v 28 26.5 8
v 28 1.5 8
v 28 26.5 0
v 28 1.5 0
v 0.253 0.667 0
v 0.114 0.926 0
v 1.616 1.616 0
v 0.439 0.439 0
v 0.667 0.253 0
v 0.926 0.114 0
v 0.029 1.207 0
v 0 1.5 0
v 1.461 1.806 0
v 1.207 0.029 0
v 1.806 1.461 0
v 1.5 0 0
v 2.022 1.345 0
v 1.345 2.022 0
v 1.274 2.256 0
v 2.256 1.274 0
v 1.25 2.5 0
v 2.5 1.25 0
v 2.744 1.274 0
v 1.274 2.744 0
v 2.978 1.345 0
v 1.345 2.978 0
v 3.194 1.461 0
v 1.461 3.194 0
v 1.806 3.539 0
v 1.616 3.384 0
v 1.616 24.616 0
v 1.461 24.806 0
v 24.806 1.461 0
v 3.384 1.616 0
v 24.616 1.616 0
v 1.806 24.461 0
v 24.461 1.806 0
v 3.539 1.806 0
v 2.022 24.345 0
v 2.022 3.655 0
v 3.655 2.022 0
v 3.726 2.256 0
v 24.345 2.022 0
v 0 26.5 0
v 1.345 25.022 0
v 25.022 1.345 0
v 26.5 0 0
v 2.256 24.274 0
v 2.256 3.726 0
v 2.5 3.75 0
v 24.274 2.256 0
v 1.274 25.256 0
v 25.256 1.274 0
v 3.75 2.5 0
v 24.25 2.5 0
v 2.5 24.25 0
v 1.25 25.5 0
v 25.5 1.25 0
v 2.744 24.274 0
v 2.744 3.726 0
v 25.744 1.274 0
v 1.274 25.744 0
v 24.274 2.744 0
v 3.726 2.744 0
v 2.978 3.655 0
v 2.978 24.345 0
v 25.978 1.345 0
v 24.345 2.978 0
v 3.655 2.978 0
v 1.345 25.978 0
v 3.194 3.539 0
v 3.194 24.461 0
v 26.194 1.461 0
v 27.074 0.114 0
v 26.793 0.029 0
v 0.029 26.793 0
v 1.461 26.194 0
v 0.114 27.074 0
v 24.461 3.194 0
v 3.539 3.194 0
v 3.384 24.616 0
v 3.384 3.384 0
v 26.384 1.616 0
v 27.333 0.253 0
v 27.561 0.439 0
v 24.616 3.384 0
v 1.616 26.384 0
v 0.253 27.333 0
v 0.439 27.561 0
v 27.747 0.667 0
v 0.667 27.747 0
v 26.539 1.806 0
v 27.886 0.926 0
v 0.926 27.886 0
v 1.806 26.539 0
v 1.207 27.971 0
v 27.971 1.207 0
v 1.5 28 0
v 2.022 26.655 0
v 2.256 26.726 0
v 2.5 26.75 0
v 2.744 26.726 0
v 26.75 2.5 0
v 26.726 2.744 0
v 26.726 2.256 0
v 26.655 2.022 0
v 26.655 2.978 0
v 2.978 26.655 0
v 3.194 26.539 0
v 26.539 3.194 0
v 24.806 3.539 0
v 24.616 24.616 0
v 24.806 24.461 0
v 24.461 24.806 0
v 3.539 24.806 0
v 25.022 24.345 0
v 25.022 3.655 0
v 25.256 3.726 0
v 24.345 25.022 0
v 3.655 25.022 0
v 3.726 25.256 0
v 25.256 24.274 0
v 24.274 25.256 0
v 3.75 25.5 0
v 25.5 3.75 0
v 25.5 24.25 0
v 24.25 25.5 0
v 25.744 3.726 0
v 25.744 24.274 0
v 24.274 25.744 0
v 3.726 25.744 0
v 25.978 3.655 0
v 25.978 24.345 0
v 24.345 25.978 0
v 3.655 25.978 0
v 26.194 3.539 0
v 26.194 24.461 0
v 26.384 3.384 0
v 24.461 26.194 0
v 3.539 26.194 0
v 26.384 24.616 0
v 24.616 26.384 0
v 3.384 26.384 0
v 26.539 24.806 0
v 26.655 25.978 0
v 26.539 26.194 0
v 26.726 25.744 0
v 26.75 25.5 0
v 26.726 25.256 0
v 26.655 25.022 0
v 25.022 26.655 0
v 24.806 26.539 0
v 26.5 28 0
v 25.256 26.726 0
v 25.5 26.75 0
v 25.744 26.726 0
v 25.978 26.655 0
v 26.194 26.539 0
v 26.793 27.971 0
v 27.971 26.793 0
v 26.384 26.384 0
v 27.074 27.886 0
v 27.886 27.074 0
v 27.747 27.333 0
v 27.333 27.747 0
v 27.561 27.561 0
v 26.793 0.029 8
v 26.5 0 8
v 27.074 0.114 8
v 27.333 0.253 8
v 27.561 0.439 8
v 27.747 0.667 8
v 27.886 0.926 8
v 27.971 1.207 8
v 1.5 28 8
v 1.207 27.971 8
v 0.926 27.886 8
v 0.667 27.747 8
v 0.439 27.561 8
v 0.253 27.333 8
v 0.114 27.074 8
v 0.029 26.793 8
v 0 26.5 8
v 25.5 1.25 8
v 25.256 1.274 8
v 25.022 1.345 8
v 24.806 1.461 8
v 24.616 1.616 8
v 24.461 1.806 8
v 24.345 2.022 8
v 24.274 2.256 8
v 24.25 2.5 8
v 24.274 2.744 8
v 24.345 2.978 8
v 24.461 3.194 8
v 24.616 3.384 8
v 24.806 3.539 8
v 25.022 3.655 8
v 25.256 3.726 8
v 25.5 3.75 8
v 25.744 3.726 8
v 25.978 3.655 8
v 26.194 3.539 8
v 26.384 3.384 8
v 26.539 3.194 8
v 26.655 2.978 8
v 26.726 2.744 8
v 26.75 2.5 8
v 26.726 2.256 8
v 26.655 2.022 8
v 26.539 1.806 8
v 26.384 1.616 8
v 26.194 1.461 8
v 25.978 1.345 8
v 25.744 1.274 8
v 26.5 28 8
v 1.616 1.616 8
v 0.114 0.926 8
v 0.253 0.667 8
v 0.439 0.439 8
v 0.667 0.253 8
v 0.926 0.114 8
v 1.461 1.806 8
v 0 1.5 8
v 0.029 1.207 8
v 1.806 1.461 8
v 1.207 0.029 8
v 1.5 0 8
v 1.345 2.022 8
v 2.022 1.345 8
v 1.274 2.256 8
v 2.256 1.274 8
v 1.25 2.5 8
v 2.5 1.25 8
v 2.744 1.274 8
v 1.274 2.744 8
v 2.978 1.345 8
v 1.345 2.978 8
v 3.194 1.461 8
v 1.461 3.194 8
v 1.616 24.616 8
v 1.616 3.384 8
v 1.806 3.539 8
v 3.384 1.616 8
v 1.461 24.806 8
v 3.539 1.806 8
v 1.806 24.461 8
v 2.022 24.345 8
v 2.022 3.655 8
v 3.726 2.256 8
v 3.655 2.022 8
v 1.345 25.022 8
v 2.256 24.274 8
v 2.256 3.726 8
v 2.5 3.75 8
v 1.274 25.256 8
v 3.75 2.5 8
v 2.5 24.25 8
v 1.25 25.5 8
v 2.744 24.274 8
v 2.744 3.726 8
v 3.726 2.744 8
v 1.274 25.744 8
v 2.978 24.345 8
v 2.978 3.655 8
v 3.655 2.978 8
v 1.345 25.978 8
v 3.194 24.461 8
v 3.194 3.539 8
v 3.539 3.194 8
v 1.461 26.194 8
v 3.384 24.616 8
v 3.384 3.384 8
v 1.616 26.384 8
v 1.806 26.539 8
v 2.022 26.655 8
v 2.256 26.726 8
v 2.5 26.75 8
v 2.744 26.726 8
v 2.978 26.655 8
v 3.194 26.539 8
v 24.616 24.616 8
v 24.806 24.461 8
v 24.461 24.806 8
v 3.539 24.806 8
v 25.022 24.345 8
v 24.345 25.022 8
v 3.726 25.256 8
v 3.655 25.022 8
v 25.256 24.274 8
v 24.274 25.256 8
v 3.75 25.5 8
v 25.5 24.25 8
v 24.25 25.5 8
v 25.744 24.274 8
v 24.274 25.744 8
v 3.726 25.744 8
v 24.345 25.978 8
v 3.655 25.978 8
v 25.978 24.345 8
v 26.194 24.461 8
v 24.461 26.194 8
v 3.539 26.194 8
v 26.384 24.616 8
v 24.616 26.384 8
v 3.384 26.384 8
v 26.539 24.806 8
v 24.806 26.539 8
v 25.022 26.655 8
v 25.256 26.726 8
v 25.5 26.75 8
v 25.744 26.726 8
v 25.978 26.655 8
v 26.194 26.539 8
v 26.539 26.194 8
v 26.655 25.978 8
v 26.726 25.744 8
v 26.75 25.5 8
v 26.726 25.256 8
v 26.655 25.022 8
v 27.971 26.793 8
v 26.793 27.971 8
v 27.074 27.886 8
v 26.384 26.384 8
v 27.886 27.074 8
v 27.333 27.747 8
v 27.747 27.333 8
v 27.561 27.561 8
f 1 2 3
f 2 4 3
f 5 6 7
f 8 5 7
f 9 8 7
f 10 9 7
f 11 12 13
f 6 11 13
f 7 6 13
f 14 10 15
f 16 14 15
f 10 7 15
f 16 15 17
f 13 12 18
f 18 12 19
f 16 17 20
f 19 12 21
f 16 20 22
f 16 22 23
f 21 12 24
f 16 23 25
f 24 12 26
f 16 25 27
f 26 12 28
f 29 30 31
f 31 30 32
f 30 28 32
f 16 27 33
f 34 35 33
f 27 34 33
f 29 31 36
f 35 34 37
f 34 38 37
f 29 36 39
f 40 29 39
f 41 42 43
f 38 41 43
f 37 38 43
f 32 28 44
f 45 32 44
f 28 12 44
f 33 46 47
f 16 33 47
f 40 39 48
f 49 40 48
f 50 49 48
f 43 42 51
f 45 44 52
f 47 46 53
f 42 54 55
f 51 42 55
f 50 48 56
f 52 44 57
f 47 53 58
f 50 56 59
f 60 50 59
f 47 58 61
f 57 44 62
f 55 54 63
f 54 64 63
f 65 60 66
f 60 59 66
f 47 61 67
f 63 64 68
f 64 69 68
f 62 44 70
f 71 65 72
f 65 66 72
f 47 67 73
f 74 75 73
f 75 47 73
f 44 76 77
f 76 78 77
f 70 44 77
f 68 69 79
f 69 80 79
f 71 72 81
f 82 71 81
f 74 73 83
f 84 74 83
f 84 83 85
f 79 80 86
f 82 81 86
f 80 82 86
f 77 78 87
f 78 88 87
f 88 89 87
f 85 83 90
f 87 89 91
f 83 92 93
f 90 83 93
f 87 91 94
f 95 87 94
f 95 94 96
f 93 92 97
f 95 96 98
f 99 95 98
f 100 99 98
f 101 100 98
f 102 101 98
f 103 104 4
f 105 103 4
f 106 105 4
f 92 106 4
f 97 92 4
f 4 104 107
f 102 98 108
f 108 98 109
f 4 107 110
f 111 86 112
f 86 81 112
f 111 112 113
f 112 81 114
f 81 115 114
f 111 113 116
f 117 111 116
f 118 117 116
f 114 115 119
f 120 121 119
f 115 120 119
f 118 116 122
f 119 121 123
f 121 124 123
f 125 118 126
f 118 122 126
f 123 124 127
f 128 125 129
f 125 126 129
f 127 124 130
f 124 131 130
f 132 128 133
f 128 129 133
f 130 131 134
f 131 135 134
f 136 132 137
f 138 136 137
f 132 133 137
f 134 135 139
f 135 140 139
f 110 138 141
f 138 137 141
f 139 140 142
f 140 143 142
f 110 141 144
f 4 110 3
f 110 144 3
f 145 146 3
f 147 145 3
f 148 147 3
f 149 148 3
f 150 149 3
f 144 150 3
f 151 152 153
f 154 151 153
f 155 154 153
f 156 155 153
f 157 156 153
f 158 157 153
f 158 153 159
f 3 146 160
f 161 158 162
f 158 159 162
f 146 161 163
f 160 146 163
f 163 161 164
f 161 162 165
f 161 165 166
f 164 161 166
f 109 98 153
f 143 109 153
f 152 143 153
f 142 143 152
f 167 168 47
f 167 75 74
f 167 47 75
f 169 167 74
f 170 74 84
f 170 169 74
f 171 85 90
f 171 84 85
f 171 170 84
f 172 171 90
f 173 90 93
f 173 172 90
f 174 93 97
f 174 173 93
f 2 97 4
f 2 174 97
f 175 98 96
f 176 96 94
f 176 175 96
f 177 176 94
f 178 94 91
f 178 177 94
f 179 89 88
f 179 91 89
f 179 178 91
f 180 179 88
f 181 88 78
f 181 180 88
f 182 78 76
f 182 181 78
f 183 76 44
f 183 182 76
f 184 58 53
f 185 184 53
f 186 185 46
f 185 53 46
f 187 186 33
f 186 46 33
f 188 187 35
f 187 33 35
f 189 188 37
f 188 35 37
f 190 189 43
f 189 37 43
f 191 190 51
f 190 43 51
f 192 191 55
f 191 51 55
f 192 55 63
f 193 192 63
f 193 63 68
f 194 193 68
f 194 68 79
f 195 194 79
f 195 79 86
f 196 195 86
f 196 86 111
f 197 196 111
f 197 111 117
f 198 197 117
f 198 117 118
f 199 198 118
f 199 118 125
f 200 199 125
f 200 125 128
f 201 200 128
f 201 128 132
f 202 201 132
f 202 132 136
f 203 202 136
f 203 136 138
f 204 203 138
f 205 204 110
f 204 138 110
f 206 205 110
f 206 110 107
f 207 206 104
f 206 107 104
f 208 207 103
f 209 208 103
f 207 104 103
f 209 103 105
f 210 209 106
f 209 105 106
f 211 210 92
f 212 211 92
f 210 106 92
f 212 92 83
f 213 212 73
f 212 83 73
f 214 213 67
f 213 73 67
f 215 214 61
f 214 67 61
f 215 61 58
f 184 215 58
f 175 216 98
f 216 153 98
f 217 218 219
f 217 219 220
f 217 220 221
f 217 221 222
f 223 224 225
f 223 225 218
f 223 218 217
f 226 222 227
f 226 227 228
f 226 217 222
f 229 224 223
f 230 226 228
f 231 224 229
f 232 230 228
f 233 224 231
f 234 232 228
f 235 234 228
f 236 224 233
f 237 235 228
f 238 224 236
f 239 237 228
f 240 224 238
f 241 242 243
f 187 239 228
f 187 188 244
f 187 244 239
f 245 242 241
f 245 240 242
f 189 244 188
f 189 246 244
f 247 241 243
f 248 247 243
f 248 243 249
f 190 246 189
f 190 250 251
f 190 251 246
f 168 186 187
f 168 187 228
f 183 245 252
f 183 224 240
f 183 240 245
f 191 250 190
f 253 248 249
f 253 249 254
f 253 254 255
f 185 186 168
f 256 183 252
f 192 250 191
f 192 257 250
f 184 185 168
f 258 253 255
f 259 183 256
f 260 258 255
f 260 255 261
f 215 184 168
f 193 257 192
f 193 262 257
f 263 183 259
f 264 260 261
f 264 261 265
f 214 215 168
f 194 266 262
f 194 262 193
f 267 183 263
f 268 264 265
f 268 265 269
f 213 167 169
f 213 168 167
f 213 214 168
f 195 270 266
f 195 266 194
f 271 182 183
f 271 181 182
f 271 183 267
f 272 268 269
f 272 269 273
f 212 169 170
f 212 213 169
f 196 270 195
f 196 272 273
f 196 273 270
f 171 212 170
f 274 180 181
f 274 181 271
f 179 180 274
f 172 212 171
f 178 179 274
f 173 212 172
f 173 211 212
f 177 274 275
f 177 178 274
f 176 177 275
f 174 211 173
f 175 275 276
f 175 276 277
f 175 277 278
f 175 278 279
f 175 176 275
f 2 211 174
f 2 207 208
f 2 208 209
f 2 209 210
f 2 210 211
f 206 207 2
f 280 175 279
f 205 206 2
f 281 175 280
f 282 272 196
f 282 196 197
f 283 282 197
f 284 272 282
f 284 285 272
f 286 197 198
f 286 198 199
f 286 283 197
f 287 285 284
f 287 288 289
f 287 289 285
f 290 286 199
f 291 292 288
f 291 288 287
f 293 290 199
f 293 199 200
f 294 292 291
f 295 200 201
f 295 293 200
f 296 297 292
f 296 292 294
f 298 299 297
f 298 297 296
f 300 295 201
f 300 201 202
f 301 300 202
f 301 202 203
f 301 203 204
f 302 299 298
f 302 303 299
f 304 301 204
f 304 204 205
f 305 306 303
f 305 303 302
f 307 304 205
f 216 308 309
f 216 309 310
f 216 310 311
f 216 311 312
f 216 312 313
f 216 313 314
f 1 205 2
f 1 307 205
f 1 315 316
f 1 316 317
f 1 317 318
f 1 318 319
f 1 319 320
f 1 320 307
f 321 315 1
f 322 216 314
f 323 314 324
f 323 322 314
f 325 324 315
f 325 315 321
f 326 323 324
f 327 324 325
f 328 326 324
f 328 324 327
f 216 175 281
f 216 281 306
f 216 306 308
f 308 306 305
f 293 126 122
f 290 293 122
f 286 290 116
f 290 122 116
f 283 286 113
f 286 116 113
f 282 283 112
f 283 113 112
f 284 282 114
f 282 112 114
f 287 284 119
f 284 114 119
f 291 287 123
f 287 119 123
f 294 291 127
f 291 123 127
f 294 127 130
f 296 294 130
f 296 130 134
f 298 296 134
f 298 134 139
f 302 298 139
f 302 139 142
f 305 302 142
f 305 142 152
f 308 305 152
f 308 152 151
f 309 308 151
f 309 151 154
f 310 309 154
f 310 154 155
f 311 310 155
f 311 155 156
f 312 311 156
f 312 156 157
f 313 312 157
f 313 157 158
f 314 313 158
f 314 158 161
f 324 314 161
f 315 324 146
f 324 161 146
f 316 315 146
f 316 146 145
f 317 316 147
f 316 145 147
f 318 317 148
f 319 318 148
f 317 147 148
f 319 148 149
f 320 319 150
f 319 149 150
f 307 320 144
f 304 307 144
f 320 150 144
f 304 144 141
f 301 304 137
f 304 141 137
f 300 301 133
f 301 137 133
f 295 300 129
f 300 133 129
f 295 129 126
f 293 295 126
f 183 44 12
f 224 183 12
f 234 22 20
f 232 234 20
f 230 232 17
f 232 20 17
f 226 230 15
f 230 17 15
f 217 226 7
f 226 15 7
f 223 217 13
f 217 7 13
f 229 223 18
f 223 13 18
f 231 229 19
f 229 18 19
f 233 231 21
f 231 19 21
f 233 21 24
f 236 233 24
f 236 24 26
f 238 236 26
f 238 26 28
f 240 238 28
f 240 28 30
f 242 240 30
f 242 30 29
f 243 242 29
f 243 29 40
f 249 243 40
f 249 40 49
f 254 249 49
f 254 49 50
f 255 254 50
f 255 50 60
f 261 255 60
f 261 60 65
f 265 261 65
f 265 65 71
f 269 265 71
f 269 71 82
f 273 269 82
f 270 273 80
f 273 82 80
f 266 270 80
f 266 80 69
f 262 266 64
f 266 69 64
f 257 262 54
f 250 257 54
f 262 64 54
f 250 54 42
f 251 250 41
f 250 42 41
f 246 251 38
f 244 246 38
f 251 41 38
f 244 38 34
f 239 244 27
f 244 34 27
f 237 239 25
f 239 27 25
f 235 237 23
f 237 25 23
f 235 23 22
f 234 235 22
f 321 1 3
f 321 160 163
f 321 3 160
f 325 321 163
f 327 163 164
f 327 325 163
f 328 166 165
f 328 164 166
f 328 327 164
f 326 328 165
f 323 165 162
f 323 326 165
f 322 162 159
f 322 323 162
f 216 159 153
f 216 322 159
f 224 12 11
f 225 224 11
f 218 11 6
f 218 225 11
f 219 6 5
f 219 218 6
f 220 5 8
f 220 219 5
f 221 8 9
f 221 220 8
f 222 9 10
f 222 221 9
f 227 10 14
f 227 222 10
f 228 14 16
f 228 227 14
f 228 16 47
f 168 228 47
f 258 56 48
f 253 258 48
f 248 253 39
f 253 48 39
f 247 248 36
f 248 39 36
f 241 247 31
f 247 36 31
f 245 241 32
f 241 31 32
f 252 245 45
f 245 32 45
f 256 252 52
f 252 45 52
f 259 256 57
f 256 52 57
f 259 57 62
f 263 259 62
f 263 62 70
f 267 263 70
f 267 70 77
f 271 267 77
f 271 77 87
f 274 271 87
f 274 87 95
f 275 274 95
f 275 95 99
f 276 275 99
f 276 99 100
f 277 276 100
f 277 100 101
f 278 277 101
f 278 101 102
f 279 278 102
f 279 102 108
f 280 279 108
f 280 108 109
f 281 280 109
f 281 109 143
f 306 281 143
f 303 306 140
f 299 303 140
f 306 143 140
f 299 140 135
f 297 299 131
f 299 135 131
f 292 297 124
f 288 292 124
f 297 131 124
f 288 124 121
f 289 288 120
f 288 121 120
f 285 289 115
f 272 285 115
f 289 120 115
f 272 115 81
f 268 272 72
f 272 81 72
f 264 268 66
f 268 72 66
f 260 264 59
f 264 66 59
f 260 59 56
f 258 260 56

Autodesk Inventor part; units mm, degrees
ref_plane "YZ Plane" through (0, 0, 0) normal (1, 0, 0) x (0, 1, 0)
ref_plane "XZ Plane" through (0, 0, 0) normal (0, 1, 0) x (-1, 0, 0)
ref_plane "XY Plane" through (0, 0, 0) normal (0, 0, 1) x (1, 0, 0)
sketch "Sketch1" plane through (0, 0, 0) normal (0, 0, 1) x (1, 0, 0)
  line L0 (0, 0) -> (28, 0)
  line L1 (28, 0) -> (28, 28)
  line L2 (28, 28) -> (0, 28)
  line L3 (0, 28) -> (0, 0)
  dimension "d0" = 28
  dimension "d1" = 28
extrude "Extrusion1" add sketch "Sketch1" along normal blind 8
fillet "Fillet1" radius 1.5 4 edges at (0, 0, 4) (28, 0, 4) (0, 28, 4) (28, 28, 4)
sketch "Sketch3" plane through (0, 0, 8) normal (0, 0, 1) x (1, 0, 0)
  line L0 (1.5, 28) -> (26.5, 28) projected
  line L1 (0, 1.5) -> (0, 26.5) projected
  line L2 (26.5, 0) -> (1.5, 0) projected
  line L3 (28, 26.5) -> (28, 1.5) projected
  point P0 (2.5, 2.5)
  point P1 (25.5, 2.5)
  point P2 (2.5, 25.5)
  point P3 (25.5, 25.5)
  dimension "d10" = 2.5
  dimension "d11" = 2.5
  dimension "d12" = 2.5
  dimension "d13" = 2.5
  dimension "d14" = 2.5
  dimension "d15" = 2.5
  dimension "d16" = 2.5
  dimension "d17" = 2.5
hole "Hole1" at (2.5, 2.5, 8) at (25.5, 2.5, 8) at (2.5, 25.5, 8) at (25.5, 25.5, 8) direction (0, 0, -1) diameter 2.5 end through all
properties part number "stepper_middle_28"
